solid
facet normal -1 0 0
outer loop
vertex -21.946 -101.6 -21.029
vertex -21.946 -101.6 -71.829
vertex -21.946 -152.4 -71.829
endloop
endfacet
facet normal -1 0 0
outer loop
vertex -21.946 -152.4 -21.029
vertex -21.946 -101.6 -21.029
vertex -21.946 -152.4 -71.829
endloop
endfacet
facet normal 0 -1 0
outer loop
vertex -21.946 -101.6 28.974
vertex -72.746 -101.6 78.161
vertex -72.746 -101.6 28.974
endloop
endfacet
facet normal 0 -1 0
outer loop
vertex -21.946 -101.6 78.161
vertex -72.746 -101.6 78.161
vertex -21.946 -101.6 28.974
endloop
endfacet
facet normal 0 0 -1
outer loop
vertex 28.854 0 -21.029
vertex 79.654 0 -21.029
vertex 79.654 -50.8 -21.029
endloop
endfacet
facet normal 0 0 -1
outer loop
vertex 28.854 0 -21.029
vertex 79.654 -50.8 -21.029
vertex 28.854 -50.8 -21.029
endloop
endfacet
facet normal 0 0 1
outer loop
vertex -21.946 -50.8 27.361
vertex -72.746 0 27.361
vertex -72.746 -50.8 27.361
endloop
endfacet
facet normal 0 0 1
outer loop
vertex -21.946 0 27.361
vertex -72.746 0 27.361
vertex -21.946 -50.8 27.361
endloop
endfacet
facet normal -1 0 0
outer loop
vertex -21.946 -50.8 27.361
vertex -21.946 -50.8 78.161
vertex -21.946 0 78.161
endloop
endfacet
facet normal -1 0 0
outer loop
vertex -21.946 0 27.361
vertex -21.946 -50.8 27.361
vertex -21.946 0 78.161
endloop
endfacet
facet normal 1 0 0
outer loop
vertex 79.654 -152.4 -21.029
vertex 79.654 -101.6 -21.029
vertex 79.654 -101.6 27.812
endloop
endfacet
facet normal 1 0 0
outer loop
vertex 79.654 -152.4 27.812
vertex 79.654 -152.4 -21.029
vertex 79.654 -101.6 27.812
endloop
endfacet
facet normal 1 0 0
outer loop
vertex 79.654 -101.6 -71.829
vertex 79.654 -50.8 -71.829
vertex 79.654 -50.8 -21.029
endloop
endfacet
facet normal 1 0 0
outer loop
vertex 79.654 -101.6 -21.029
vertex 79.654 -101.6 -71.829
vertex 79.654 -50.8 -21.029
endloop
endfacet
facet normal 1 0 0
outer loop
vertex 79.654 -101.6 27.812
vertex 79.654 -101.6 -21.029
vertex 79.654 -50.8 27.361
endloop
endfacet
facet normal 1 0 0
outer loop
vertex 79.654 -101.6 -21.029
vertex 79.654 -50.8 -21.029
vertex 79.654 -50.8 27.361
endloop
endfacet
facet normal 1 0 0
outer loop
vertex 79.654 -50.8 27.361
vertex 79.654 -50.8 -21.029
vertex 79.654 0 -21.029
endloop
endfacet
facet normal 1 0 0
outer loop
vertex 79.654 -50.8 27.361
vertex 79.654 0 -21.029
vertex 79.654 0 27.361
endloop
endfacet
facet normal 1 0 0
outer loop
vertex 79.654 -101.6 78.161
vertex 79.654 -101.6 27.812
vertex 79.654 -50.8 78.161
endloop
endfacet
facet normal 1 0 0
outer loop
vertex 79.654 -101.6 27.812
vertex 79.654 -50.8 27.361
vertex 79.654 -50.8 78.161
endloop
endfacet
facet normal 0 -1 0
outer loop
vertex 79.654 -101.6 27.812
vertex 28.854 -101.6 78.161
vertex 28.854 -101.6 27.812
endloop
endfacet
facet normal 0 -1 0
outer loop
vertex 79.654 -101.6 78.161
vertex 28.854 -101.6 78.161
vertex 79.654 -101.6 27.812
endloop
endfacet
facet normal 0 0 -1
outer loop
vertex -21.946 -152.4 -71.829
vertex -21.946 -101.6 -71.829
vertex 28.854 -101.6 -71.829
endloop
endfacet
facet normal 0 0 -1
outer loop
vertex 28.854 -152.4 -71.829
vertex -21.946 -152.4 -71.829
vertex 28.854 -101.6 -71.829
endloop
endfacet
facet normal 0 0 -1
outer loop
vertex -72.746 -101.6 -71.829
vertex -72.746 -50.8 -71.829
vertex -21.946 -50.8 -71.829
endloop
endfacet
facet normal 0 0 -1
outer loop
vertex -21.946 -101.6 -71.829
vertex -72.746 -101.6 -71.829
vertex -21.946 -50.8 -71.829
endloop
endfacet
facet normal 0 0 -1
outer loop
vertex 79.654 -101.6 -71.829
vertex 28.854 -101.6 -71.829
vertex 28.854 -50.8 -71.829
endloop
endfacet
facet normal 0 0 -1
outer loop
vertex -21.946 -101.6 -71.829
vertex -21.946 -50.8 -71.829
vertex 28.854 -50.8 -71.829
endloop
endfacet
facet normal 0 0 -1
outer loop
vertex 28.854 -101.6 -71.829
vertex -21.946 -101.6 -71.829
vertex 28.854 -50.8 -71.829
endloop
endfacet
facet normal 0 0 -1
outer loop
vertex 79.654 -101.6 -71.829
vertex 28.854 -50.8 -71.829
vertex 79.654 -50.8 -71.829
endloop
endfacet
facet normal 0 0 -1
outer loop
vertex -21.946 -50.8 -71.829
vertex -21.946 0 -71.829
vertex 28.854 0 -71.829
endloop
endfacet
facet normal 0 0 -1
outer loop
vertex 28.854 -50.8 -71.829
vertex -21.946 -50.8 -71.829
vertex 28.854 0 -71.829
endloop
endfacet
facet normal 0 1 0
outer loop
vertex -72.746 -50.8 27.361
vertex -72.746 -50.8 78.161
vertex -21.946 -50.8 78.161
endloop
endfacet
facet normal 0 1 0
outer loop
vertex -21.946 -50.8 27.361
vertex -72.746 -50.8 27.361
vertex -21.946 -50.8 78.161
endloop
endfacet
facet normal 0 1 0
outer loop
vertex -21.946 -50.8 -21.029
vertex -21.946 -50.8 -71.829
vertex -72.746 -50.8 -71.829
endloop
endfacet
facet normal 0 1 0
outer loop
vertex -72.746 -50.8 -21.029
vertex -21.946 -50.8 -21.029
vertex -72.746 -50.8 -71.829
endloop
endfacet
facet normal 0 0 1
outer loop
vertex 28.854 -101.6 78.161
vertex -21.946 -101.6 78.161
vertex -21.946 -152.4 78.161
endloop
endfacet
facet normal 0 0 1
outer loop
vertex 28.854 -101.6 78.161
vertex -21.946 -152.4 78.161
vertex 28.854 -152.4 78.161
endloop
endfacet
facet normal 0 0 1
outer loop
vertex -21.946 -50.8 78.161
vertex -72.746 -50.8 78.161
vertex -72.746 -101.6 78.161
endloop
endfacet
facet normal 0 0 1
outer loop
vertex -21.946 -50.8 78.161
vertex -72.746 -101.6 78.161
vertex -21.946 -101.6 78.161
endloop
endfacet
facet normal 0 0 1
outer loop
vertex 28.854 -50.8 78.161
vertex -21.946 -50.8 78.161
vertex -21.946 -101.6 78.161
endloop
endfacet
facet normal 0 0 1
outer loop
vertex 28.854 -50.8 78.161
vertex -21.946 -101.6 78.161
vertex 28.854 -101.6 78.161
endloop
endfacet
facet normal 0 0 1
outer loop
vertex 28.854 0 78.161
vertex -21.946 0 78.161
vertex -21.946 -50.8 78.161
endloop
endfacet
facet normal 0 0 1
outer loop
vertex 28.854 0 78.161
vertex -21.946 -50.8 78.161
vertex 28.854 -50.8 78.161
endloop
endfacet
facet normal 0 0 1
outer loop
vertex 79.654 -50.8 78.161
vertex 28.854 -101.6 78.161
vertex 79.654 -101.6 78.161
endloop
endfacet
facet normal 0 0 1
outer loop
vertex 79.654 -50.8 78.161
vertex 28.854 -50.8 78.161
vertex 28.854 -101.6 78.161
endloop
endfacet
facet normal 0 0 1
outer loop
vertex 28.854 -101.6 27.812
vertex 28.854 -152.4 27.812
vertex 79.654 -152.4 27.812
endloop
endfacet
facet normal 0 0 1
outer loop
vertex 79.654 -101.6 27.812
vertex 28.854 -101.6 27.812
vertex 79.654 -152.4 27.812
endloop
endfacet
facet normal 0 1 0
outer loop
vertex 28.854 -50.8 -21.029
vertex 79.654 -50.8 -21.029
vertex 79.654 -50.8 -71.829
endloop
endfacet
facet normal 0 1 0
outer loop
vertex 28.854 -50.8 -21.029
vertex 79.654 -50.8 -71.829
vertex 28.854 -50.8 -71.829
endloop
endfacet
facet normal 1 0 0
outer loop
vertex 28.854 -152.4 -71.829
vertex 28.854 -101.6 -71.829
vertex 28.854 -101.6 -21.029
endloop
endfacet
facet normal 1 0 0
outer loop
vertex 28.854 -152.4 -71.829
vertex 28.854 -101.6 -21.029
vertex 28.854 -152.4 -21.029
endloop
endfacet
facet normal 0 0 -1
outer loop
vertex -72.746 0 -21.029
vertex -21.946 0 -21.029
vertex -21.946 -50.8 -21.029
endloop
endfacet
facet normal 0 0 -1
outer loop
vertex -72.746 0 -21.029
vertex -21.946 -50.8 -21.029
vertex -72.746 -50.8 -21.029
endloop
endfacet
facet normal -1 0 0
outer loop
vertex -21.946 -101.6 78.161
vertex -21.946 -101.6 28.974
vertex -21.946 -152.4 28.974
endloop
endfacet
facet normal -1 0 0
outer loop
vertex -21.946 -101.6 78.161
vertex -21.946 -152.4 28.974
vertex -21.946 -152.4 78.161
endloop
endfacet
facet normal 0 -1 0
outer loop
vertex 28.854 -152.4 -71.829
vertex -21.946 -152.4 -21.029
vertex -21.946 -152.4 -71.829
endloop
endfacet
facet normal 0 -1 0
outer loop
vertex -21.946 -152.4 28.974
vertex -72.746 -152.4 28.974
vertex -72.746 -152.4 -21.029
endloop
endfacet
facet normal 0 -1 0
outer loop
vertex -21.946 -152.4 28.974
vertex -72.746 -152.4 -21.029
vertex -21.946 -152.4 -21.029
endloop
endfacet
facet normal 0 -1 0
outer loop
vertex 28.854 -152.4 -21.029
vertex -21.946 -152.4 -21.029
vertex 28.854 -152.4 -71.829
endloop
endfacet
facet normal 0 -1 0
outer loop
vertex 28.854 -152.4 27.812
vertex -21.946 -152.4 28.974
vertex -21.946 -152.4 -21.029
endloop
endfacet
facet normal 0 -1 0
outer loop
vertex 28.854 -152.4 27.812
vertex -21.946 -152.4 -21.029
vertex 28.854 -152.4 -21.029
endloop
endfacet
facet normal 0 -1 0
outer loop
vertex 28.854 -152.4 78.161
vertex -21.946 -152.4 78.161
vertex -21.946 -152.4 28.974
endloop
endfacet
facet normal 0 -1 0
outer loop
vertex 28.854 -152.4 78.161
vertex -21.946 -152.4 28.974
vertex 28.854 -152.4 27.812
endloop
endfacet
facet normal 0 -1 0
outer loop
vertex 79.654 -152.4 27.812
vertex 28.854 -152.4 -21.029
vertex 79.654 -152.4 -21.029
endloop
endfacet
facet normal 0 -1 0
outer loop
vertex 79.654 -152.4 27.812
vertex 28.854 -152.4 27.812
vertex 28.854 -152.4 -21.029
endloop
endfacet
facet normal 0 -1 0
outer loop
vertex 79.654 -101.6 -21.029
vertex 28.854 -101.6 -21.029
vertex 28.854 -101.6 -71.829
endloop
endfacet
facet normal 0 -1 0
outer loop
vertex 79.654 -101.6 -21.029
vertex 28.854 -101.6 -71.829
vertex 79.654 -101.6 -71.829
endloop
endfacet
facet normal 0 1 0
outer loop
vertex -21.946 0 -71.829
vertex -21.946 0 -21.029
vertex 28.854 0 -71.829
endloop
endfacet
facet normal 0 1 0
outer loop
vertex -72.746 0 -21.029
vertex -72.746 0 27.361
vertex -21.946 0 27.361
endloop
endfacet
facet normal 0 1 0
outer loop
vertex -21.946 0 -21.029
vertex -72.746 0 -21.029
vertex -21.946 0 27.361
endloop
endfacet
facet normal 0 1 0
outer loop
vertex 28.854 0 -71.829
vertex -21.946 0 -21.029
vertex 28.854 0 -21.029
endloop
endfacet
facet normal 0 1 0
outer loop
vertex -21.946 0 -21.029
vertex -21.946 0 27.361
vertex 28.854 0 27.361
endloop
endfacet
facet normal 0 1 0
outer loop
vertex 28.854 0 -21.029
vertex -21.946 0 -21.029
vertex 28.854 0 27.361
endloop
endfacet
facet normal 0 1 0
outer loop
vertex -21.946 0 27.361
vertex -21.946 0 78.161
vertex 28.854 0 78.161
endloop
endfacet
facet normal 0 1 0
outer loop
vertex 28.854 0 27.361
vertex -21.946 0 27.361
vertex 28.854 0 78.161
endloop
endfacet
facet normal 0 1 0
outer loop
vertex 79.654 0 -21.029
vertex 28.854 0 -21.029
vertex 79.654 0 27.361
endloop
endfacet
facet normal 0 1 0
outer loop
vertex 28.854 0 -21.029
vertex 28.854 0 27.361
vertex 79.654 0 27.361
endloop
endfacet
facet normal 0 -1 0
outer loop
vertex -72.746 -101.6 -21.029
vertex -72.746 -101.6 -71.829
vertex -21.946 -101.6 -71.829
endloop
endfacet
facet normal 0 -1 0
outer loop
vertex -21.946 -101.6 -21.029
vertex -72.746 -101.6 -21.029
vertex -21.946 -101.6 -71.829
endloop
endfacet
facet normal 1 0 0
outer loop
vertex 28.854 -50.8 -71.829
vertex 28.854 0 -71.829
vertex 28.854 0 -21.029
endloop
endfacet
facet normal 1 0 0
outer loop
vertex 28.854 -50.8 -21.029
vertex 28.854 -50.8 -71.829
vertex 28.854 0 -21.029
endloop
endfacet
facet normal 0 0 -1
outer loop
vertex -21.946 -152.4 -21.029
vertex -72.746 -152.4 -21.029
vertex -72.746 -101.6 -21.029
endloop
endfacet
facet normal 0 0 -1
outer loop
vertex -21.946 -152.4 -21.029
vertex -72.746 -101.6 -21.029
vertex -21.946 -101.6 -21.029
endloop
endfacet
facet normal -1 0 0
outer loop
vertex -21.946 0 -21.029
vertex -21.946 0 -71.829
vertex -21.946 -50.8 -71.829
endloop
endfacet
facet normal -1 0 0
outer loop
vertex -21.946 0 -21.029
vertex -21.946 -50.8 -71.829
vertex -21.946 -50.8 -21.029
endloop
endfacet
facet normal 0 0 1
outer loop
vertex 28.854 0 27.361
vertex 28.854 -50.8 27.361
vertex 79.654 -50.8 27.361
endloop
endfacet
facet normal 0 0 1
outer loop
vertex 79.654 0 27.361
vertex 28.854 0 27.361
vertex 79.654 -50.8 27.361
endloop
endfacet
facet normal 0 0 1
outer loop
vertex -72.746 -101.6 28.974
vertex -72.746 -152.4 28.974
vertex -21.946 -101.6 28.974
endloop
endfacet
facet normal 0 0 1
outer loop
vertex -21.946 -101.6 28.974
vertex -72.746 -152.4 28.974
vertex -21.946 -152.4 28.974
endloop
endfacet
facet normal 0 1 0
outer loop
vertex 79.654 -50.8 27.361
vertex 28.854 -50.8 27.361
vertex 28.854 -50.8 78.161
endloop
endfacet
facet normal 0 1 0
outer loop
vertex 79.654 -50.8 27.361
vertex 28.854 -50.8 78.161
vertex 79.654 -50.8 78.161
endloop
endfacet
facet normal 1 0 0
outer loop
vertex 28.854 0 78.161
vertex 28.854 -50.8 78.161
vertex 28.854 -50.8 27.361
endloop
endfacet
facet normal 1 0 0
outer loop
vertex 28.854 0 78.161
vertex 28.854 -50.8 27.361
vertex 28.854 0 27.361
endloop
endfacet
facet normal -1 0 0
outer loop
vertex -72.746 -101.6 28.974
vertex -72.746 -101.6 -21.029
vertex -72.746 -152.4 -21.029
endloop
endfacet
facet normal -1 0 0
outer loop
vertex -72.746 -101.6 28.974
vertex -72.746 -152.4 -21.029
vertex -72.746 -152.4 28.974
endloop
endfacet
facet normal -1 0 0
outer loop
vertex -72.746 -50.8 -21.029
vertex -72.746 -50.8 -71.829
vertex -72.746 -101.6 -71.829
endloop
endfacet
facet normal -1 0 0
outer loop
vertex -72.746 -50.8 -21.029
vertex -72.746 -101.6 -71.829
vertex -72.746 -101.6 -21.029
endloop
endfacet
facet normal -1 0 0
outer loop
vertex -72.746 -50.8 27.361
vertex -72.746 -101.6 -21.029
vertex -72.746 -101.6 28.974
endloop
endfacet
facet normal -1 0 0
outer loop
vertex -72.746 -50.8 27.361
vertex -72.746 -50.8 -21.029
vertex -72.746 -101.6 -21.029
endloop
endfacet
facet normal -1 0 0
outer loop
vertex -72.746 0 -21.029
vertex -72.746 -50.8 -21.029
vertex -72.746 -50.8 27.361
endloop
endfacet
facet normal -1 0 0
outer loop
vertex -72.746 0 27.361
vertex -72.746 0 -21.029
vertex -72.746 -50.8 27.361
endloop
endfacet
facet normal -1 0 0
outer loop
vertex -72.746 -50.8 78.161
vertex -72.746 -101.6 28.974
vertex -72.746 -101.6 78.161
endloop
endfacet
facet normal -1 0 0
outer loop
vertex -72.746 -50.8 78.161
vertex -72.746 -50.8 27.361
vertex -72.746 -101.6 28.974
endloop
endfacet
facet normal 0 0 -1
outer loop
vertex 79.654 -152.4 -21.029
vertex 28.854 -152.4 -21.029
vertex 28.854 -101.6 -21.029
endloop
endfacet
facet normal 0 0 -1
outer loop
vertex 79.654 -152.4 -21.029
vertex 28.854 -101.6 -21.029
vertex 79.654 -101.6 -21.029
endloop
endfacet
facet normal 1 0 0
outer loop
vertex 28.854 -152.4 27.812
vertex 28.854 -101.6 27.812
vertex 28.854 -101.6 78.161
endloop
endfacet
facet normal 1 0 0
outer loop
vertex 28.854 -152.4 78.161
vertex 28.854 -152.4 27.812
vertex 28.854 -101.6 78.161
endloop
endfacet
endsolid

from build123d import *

# Parameters (mm, degrees)
F0_W      = 152.4
F0_H      = 149.9905144195
F1_DEPTH  = 152.4
F2_W      = 50.8
F2_H      = 49.1875803169
F3_DEPTH  = 50.8
F4_W      = 50.8
F4_H      = 50.3492622576
F5_DEPTH  = 50.8
F6_W      = 50.8
F6_H      = 50.8
F7_DEPTH  = 343
F8_W      = 50.8
F8_H      = 50.8
F9_DEPTH  = 50.8
F10_W     = 50.8
F10_H     = 50.8
F11_DEPTH = 50.8
F12_W     = 50.8
F12_H     = 50.8
F13_DEPTH = 50.8


# Not quite as in the source:
# - an extrude ends at something that could not be found from the text; its depth is read off the source's solid
# - a feature names something its author has since deleted; it is built from what else it names


with BuildPart() as f1:
    # F0 (on Front) → F1 (new body)
    with BuildSketch(Plane.XZ):
        with Locations((3.4536700696, 3.1658634543)):
            Rectangle(F0_W, F0_H)
    extrude(amount=F1_DEPTH)

    # F2 (on face) → F3 (cut)
    with BuildSketch(Plane.XZ.offset(152.4)):
        with Locations((-47.3463299304, 53.5673305057)):
            Rectangle(F2_W, F2_H)
    extrude(amount=-F3_DEPTH, mode=Mode.SUBTRACT)

    # F4 (on face) → F5 (cut)
    with BuildSketch(Plane.XZ.offset(152.4)):
        with Locations((54.2536700696, 52.9864895353)):
            Rectangle(F4_W, F4_H)
    extrude(amount=-F5_DEPTH, mode=Mode.SUBTRACT)

    # F6 (on face) → F7 (cut, through all)
    with BuildSketch(Plane.XZ.offset(152.4)):
        with Locations((-47.3463299304, -46.4293937554)):
            Rectangle(F6_W, F6_H)
    extrude(amount=F7_DEPTH, mode=Mode.SUBTRACT)

    # F8 (on face) → F9 (cut)
    with BuildSketch(Plane(origin=(0, 0, 0), x_dir=(-1, 0, 0), z_dir=(0, 1, 0))):
        with Locations((-54.2536700696, -46.4293937554)):
            Rectangle(F8_W, F8_H)
        with Locations((47.3463299304, -46.4293937554)):
            Rectangle(F8_W, F8_H)
    extrude(amount=-F9_DEPTH, mode=Mode.SUBTRACT)

    # F10 (on face) → F11 (cut)
    with BuildSketch(Plane(origin=(0, 0, -71.8293937554), x_dir=(1, 0, 0), z_dir=(0, 0, -1))):
        with Locations((-47.3463299304, 127)):
            Rectangle(F10_W, F10_H)
        with Locations((54.2536700696, 127)):
            Rectangle(F10_W, F10_H)
    extrude(amount=-F11_DEPTH, mode=Mode.SUBTRACT)

    # F12 (on face) → F13 (cut)
    with BuildSketch(Plane.XY.offset(78.1611206641)):
        with Locations((-47.3463299304, -25.4)):
            Rectangle(F12_W, F12_H)
        with Locations((54.2536700696, -25.4)):
            Rectangle(F12_W, F12_H)
    extrude(amount=-F13_DEPTH, mode=Mode.SUBTRACT)


solid = f1.part
